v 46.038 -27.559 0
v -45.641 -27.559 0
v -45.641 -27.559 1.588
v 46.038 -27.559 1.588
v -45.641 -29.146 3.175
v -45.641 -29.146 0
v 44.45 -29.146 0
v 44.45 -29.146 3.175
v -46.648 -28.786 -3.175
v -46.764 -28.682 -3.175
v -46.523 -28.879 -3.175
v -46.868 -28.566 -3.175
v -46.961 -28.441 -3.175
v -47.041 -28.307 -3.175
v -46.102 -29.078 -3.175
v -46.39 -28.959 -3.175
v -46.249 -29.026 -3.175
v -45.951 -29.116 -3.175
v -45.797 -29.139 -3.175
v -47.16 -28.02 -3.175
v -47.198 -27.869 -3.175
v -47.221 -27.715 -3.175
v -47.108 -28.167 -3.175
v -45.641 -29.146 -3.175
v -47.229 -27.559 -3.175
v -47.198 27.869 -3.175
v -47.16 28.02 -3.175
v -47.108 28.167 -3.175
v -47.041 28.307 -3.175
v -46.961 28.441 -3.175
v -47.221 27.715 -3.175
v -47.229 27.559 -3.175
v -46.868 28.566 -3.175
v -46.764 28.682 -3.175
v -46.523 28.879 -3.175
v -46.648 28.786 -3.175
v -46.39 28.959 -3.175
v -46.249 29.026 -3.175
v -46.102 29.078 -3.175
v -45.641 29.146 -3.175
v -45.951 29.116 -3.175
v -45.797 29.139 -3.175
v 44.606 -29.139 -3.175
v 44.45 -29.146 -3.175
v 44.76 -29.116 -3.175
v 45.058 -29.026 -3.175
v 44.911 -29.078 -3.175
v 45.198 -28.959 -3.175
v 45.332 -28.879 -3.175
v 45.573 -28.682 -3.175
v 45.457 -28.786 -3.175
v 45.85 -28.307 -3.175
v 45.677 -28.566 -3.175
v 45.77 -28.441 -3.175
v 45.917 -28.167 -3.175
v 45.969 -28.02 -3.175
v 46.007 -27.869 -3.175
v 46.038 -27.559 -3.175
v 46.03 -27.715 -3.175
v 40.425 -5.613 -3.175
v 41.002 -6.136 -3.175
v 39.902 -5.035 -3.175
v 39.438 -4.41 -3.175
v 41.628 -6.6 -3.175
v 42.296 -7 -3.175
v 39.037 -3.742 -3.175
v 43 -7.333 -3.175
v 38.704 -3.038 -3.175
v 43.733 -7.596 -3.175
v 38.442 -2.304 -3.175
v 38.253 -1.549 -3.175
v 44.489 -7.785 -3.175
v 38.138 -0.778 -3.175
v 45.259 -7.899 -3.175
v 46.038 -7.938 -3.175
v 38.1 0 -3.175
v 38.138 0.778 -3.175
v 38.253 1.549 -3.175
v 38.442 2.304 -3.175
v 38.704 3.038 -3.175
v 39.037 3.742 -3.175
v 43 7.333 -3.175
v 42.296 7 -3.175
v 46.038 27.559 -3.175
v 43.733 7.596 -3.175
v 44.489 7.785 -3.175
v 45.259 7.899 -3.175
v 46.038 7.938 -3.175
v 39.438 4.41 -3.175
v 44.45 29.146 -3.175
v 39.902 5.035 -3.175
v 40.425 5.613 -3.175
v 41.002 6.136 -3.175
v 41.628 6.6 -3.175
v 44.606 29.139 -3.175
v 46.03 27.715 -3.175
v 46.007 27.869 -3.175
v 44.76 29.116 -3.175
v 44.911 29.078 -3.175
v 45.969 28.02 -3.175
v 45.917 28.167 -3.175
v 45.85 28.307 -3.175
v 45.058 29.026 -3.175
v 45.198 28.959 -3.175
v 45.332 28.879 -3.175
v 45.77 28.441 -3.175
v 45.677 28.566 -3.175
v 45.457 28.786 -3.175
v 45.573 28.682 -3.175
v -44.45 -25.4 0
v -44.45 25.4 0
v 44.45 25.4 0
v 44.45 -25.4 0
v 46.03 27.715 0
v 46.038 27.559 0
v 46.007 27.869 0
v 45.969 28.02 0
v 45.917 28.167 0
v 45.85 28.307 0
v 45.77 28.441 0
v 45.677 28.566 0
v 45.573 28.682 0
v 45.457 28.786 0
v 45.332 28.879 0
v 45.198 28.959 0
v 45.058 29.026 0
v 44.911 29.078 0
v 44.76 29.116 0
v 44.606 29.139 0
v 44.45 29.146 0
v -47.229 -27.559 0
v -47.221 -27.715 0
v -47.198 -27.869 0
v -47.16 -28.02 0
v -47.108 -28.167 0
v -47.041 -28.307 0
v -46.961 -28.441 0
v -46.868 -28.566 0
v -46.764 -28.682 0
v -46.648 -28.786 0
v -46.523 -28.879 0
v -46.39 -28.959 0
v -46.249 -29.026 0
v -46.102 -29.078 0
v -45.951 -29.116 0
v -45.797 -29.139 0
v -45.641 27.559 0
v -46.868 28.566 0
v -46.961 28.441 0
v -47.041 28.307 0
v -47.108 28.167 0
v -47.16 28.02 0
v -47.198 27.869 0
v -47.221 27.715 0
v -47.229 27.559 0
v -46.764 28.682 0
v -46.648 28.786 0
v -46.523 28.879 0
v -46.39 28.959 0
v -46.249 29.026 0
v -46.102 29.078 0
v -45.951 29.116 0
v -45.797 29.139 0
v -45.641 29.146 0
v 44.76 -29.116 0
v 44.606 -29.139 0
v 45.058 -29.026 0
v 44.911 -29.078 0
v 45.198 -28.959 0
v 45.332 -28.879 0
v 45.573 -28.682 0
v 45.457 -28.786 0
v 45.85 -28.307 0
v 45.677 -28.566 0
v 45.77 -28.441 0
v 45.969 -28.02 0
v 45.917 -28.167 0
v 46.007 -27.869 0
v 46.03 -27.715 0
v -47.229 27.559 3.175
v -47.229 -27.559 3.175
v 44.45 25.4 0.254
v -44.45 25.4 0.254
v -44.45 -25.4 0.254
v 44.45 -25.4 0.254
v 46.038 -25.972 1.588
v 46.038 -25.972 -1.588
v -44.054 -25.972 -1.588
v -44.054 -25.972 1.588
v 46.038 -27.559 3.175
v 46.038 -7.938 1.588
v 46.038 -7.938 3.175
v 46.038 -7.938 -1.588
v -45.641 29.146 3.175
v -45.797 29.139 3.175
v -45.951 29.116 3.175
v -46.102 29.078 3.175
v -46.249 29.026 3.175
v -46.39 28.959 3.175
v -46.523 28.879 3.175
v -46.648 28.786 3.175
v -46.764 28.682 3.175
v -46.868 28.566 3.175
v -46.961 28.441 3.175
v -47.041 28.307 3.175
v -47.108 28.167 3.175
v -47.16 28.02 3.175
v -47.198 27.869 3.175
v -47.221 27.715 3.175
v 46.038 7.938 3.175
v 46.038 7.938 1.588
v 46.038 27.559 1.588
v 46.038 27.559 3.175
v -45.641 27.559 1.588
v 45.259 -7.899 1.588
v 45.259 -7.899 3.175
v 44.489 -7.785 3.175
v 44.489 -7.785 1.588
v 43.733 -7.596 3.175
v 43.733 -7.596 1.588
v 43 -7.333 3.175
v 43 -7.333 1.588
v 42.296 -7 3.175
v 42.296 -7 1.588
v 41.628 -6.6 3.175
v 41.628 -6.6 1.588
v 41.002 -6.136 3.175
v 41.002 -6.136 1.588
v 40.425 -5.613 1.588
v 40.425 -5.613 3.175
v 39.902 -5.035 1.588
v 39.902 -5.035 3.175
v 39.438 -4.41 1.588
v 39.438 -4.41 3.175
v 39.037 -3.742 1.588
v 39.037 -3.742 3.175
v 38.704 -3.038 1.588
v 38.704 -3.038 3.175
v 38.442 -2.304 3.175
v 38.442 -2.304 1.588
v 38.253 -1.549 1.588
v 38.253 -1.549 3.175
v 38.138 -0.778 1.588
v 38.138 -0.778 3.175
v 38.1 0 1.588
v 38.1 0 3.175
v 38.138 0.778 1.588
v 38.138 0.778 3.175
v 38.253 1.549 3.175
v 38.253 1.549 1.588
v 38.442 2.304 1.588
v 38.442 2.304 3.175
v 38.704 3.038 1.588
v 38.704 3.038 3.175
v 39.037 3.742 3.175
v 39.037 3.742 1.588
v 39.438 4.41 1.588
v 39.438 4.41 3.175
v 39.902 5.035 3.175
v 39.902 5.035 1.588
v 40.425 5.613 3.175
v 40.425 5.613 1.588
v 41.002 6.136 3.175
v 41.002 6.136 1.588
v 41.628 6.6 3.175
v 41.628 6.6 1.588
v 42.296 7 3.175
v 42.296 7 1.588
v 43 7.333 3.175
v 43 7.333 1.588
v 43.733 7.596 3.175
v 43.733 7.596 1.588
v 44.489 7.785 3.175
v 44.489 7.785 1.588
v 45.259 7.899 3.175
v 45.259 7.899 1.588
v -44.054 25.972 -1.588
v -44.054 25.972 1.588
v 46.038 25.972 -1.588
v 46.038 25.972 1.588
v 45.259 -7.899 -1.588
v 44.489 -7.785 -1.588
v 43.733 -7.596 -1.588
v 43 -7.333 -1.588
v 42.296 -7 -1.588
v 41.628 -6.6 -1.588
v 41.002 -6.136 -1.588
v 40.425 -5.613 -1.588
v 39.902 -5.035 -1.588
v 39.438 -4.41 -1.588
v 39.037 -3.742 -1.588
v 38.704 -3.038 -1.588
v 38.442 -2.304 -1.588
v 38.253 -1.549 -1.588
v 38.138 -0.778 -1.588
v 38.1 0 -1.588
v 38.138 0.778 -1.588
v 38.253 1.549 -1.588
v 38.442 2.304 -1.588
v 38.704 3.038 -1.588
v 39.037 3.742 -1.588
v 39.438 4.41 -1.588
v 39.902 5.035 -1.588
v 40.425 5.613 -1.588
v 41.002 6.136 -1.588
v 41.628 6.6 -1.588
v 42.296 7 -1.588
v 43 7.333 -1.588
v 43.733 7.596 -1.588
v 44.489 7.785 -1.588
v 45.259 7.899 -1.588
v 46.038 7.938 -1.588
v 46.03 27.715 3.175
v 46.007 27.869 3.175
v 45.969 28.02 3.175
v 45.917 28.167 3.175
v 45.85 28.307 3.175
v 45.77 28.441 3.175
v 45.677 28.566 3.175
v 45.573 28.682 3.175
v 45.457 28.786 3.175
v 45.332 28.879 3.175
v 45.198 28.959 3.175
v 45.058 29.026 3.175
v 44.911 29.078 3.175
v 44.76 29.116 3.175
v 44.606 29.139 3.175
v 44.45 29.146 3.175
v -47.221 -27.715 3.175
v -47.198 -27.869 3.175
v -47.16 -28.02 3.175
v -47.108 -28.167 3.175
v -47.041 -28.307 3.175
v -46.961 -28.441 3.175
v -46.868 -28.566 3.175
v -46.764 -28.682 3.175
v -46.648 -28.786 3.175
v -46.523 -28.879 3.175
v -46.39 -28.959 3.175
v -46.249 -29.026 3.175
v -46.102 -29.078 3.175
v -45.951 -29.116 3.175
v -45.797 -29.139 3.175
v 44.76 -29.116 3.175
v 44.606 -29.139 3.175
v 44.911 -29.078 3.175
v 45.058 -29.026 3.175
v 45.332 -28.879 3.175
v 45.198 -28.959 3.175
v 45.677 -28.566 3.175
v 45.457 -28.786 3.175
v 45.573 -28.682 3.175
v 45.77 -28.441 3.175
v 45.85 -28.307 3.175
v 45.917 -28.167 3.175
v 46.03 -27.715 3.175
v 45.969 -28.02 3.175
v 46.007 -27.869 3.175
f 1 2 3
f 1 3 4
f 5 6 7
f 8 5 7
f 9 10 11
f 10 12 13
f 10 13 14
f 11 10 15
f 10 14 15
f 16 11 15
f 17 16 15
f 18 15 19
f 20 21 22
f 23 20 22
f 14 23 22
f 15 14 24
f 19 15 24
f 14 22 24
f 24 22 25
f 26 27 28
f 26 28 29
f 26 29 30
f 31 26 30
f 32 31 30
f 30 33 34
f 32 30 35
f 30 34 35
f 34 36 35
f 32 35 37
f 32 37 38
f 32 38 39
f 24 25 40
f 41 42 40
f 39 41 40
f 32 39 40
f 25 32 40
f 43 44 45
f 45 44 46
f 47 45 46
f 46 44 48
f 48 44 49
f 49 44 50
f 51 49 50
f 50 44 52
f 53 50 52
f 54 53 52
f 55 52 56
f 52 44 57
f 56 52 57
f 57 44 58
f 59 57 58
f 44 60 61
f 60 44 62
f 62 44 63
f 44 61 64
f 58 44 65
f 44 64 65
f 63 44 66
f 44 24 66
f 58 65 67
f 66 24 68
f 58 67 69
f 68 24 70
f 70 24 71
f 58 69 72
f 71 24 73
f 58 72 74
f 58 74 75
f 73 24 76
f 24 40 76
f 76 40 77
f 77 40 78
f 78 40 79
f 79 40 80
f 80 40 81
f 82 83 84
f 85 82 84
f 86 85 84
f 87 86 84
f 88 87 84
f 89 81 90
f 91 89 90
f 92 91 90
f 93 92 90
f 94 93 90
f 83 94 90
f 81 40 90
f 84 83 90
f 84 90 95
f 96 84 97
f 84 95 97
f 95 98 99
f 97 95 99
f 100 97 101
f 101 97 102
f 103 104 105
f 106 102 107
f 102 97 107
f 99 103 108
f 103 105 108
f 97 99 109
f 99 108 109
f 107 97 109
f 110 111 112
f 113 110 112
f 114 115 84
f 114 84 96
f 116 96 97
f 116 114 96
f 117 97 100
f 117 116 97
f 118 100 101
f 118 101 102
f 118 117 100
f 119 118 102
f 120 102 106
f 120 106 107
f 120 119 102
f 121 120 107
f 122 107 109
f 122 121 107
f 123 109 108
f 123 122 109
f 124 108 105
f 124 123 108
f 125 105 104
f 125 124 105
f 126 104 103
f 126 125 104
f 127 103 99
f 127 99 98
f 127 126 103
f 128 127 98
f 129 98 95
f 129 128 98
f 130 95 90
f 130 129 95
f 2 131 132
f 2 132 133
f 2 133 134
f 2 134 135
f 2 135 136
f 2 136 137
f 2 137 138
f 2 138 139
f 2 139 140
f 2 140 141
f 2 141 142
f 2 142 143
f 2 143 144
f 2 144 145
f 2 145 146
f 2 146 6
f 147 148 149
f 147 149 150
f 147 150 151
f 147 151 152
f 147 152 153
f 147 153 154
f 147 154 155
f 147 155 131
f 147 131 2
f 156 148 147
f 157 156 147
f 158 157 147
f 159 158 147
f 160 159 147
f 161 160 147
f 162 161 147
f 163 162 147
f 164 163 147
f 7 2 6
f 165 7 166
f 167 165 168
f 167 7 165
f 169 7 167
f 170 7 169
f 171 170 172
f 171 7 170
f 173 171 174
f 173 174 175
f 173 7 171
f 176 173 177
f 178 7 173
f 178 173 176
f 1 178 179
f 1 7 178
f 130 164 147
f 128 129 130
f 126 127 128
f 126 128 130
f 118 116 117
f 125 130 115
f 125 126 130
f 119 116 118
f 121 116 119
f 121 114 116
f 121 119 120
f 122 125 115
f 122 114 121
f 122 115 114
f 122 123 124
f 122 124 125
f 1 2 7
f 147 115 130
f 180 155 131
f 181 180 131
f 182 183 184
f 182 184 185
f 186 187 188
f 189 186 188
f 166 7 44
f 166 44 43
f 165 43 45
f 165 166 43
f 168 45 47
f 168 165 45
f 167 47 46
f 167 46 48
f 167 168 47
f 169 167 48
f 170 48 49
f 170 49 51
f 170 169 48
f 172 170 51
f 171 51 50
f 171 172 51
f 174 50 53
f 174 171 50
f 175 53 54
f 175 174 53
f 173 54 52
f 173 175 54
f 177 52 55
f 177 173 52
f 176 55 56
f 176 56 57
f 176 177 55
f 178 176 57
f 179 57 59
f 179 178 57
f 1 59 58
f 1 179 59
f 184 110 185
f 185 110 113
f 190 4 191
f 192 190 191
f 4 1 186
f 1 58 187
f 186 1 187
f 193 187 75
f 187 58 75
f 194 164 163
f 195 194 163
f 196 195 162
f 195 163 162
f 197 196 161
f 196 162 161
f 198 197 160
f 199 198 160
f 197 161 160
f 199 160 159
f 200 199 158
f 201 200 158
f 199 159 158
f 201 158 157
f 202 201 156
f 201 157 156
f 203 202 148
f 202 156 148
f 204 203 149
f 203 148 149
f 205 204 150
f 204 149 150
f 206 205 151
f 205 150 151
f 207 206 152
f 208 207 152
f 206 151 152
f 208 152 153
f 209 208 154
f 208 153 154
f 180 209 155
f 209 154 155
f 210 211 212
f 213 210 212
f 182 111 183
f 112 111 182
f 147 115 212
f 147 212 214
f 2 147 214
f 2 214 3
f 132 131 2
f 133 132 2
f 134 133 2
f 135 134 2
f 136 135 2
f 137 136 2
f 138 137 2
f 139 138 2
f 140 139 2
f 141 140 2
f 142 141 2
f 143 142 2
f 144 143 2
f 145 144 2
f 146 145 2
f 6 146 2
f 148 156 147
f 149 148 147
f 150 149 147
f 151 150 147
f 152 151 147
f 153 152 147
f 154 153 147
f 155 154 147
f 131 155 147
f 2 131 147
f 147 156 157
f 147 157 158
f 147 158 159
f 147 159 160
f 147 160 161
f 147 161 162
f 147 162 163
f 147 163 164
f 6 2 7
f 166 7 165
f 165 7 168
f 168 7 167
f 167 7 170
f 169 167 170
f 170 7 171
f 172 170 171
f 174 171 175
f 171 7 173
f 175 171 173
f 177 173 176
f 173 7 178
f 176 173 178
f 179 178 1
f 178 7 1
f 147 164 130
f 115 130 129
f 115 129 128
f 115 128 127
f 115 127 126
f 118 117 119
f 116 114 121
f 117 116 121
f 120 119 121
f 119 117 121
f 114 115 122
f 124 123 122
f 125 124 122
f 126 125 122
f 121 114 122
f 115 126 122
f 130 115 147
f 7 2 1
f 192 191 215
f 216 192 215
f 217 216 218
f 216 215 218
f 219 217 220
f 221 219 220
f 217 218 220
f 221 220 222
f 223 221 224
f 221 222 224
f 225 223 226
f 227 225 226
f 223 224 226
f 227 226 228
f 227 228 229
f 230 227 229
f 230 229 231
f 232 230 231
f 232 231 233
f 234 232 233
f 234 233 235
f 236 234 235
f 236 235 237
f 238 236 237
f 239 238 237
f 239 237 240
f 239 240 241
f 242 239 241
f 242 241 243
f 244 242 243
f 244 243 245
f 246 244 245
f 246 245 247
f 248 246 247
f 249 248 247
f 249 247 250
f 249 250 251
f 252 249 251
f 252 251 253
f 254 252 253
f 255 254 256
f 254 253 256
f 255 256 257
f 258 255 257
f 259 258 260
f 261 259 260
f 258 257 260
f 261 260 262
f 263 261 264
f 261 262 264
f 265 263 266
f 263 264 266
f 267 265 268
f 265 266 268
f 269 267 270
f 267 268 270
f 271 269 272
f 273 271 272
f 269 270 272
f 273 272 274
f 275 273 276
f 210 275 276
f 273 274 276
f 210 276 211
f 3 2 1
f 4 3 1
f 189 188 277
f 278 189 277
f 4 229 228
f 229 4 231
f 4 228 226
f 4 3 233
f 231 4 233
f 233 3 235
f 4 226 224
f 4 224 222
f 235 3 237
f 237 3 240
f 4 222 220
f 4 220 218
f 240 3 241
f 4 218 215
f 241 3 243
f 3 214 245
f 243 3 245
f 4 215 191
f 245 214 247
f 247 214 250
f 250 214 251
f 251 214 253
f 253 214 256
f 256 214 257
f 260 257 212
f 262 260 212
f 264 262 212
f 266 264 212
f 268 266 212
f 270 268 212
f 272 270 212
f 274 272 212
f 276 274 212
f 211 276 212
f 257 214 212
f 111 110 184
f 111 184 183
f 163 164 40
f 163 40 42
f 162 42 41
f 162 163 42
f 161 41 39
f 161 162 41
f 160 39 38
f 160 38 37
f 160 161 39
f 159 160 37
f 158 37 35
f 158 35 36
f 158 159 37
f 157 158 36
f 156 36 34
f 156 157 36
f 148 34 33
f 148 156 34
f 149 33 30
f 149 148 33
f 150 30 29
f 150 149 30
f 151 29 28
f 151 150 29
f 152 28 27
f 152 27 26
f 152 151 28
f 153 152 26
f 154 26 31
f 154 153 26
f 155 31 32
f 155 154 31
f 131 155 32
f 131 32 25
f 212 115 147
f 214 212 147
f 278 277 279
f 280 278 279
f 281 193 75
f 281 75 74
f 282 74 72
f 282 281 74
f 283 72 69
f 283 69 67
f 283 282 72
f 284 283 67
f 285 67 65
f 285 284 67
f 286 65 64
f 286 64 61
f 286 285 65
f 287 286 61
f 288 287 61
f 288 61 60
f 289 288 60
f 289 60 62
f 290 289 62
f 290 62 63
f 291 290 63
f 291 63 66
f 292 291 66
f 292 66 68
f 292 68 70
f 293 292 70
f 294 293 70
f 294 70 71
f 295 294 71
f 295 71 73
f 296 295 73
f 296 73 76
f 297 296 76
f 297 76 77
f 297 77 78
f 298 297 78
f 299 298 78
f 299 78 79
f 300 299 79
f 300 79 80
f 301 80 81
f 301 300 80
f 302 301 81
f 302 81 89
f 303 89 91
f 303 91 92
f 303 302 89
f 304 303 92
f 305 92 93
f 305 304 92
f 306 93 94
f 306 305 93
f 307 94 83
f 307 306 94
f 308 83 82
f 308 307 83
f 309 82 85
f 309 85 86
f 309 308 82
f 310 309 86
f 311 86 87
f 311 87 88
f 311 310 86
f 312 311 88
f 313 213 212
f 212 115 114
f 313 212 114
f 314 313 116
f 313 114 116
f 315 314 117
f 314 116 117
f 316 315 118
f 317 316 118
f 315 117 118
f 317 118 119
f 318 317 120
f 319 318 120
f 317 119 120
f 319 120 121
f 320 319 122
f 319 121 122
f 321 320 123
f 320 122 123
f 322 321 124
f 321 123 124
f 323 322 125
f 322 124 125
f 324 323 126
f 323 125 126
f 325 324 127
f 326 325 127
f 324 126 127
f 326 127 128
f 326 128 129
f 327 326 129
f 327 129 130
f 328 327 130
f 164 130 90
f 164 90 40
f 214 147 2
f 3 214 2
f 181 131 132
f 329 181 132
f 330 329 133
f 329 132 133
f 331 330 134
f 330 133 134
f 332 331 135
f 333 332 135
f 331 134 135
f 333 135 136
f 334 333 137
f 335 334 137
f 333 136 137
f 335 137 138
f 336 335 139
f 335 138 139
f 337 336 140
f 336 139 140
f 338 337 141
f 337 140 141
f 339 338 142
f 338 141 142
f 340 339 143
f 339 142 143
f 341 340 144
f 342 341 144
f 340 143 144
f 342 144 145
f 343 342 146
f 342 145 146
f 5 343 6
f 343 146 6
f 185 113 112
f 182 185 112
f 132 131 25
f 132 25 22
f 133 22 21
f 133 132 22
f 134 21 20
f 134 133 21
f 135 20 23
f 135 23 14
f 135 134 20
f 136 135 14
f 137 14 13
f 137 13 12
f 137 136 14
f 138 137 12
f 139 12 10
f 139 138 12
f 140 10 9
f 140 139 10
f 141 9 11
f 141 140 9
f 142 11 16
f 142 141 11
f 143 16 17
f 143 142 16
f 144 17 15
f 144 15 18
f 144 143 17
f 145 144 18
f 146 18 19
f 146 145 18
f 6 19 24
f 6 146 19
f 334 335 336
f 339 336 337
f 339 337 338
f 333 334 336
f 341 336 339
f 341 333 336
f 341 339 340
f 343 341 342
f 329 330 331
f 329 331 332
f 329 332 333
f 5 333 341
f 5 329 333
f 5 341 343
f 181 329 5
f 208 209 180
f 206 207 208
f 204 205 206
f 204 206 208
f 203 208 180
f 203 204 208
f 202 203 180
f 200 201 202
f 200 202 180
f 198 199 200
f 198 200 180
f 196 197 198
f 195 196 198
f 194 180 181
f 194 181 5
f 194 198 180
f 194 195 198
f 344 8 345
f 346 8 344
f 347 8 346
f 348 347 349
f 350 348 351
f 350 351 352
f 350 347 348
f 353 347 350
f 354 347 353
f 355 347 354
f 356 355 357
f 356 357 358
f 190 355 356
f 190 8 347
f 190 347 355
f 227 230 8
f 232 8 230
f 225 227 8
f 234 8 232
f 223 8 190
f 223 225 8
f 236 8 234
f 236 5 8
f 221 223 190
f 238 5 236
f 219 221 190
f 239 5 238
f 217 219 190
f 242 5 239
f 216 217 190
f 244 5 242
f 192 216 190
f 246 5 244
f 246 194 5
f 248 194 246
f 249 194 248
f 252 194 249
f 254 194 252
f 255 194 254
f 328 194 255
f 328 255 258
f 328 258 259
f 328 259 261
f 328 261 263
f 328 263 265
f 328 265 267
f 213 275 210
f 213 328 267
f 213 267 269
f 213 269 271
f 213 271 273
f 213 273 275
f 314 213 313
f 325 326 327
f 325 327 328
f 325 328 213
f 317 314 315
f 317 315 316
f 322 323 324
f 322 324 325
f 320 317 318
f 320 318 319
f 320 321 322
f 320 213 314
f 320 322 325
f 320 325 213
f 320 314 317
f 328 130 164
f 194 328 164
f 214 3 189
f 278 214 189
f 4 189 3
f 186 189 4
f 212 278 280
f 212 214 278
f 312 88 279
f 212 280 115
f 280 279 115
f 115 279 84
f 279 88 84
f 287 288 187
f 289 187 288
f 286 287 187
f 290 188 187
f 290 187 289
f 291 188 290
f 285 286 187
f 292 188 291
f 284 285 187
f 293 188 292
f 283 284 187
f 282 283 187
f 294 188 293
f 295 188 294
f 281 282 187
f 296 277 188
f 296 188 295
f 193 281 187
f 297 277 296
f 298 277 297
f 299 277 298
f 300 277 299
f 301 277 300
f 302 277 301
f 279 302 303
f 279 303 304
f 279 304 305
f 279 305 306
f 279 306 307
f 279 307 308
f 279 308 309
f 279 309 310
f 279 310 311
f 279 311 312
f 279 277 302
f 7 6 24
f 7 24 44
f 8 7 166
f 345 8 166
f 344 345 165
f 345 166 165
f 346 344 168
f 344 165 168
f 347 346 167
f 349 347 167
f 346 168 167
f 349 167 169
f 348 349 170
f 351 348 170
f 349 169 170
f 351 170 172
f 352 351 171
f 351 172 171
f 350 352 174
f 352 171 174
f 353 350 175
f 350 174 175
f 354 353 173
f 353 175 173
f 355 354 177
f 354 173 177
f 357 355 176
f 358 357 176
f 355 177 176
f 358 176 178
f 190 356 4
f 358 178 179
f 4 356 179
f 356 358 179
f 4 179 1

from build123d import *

# Parameters (mm, degrees)
F0_W     = 88.9
F0_H     = 50.8
F2_DEPTH = 0.254
F3_DEPTH = 3.175
F4_DEPTH = 1.5875
F5_DEPTH = 1.5875
F6_DEPTH = 3.175
F7_DEPTH = 1.5875


with BuildPart() as f2:
    # F0 (on Top) → F2 (new body)
    with BuildSketch(Plane.XY):
        Rectangle(F0_W, F0_H)
    extrude(amount=F2_DEPTH)


with BuildPart() as f3:
    # F1 (on Top) → F3 (new body)
    with BuildSketch(Plane.XY):
        Polygon((-44.05376, 25.9715), (46.0375, 25.9715), (46.0375, 27.559), (-45.64126, 27.559), (-45.64126, -27.559), (46.0375, -27.559), (46.0375, -25.9715), (-44.05376, -25.9715), align=None)
        with BuildLine():
            Line((46.0375, 7.9375), (46.0375, 25.9715))
            Line((46.0375, 25.9715), (-44.05376, 25.9715))
            Line((-44.05376, 25.9715), (-44.05376, -25.9715))
            Line((-44.05376, -25.9715), (46.0375, -25.9715))
            Line((46.0375, -25.9715), (46.0375, -7.9375))
            ThreePointArc((46.0375, -7.9375), (38.1, 0), (46.0375, 7.9375))
        make_face()
        with BuildLine():
            Line((-45.64126, 27.559), (46.0375, 27.559))
            ThreePointArc((46.0375, 27.559), (45.5725320151, 28.6815320151), (44.45, 29.1465))
            Line((44.45, 29.1465), (-45.64126, 29.1465))
            ThreePointArc((-45.64126, 29.1465), (-46.7637920151, 28.6815320151), (-47.22876, 27.559))
            Line((-47.22876, 27.559), (-47.22876, -27.559))
            ThreePointArc((-47.22876, -27.559), (-46.7637920151, -28.6815320151), (-45.64126, -29.1465))
            Line((-45.64126, -29.1465), (44.45, -29.1465))
            ThreePointArc((44.45, -29.1465), (45.5725320151, -28.6815320151), (46.0375, -27.559))
            Line((46.0375, -27.559), (-45.64126, -27.559))
            Line((-45.64126, -27.559), (-45.64126, 27.559))
        make_face()
    extrude(amount=-F3_DEPTH)

    # F1 (on Top) → F4 (cut)
    with BuildSketch(Plane.XY):
        with BuildLine():
            Line((46.0375, 7.9375), (46.0375, 25.9715))
            Line((46.0375, 25.9715), (-44.05376, 25.9715))
            Line((-44.05376, 25.9715), (-44.05376, -25.9715))
            Line((-44.05376, -25.9715), (46.0375, -25.9715))
            Line((46.0375, -25.9715), (46.0375, -7.9375))
            ThreePointArc((46.0375, -7.9375), (38.1, 0), (46.0375, 7.9375))
        make_face()
    extrude(amount=-F4_DEPTH, mode=Mode.SUBTRACT)

    # F1 (on Top) → F5 (join)
    with BuildSketch(Plane.XY):
        Polygon((-44.05376, 25.9715), (46.0375, 25.9715), (46.0375, 27.559), (-45.64126, 27.559), (-45.64126, -27.559), (46.0375, -27.559), (46.0375, -25.9715), (-44.05376, -25.9715), align=None)
    extrude(amount=F5_DEPTH)


with BuildPart() as f6:
    # F1 (on Top) → F6 (new body)
    with BuildSketch(Plane.XY):
        with BuildLine():
            Line((46.0375, 7.9375), (46.0375, 25.9715))
            Line((46.0375, 25.9715), (-44.05376, 25.9715))
            Line((-44.05376, 25.9715), (-44.05376, -25.9715))
            Line((-44.05376, -25.9715), (46.0375, -25.9715))
            Line((46.0375, -25.9715), (46.0375, -7.9375))
            ThreePointArc((46.0375, -7.9375), (38.1, 0), (46.0375, 7.9375))
        make_face()
        Polygon((-44.05376, 25.9715), (46.0375, 25.9715), (46.0375, 27.559), (-45.64126, 27.559), (-45.64126, -27.559), (46.0375, -27.559), (46.0375, -25.9715), (-44.05376, -25.9715), align=None)
        with BuildLine():
            Line((-45.64126, 27.559), (46.0375, 27.559))
            ThreePointArc((46.0375, 27.559), (45.5725320151, 28.6815320151), (44.45, 29.1465))
            Line((44.45, 29.1465), (-45.64126, 29.1465))
            ThreePointArc((-45.64126, 29.1465), (-46.7637920151, 28.6815320151), (-47.22876, 27.559))
            Line((-47.22876, 27.559), (-47.22876, -27.559))
            ThreePointArc((-47.22876, -27.559), (-46.7637920151, -28.6815320151), (-45.64126, -29.1465))
            Line((-45.64126, -29.1465), (44.45, -29.1465))
            ThreePointArc((44.45, -29.1465), (45.5725320151, -28.6815320151), (46.0375, -27.559))
            Line((46.0375, -27.559), (-45.64126, -27.559))
            Line((-45.64126, -27.559), (-45.64126, 27.559))
        make_face()
    extrude(amount=F6_DEPTH)

    # F1 (on Top) → F7 (cut)
    with BuildSketch(Plane.XY):
        with BuildLine():
            Line((46.0375, 7.9375), (46.0375, 25.9715))
            Line((46.0375, 25.9715), (-44.05376, 25.9715))
            Line((-44.05376, 25.9715), (-44.05376, -25.9715))
            Line((-44.05376, -25.9715), (46.0375, -25.9715))
            Line((46.0375, -25.9715), (46.0375, -7.9375))
            ThreePointArc((46.0375, -7.9375), (38.1, 0), (46.0375, 7.9375))
        make_face()
        Polygon((-44.05376, 25.9715), (46.0375, 25.9715), (46.0375, 27.559), (-45.64126, 27.559), (-45.64126, -27.559), (46.0375, -27.559), (46.0375, -25.9715), (-44.05376, -25.9715), align=None)
    extrude(amount=F7_DEPTH, mode=Mode.SUBTRACT)


solid = Compound([f2.part, f3.part, f6.part])
